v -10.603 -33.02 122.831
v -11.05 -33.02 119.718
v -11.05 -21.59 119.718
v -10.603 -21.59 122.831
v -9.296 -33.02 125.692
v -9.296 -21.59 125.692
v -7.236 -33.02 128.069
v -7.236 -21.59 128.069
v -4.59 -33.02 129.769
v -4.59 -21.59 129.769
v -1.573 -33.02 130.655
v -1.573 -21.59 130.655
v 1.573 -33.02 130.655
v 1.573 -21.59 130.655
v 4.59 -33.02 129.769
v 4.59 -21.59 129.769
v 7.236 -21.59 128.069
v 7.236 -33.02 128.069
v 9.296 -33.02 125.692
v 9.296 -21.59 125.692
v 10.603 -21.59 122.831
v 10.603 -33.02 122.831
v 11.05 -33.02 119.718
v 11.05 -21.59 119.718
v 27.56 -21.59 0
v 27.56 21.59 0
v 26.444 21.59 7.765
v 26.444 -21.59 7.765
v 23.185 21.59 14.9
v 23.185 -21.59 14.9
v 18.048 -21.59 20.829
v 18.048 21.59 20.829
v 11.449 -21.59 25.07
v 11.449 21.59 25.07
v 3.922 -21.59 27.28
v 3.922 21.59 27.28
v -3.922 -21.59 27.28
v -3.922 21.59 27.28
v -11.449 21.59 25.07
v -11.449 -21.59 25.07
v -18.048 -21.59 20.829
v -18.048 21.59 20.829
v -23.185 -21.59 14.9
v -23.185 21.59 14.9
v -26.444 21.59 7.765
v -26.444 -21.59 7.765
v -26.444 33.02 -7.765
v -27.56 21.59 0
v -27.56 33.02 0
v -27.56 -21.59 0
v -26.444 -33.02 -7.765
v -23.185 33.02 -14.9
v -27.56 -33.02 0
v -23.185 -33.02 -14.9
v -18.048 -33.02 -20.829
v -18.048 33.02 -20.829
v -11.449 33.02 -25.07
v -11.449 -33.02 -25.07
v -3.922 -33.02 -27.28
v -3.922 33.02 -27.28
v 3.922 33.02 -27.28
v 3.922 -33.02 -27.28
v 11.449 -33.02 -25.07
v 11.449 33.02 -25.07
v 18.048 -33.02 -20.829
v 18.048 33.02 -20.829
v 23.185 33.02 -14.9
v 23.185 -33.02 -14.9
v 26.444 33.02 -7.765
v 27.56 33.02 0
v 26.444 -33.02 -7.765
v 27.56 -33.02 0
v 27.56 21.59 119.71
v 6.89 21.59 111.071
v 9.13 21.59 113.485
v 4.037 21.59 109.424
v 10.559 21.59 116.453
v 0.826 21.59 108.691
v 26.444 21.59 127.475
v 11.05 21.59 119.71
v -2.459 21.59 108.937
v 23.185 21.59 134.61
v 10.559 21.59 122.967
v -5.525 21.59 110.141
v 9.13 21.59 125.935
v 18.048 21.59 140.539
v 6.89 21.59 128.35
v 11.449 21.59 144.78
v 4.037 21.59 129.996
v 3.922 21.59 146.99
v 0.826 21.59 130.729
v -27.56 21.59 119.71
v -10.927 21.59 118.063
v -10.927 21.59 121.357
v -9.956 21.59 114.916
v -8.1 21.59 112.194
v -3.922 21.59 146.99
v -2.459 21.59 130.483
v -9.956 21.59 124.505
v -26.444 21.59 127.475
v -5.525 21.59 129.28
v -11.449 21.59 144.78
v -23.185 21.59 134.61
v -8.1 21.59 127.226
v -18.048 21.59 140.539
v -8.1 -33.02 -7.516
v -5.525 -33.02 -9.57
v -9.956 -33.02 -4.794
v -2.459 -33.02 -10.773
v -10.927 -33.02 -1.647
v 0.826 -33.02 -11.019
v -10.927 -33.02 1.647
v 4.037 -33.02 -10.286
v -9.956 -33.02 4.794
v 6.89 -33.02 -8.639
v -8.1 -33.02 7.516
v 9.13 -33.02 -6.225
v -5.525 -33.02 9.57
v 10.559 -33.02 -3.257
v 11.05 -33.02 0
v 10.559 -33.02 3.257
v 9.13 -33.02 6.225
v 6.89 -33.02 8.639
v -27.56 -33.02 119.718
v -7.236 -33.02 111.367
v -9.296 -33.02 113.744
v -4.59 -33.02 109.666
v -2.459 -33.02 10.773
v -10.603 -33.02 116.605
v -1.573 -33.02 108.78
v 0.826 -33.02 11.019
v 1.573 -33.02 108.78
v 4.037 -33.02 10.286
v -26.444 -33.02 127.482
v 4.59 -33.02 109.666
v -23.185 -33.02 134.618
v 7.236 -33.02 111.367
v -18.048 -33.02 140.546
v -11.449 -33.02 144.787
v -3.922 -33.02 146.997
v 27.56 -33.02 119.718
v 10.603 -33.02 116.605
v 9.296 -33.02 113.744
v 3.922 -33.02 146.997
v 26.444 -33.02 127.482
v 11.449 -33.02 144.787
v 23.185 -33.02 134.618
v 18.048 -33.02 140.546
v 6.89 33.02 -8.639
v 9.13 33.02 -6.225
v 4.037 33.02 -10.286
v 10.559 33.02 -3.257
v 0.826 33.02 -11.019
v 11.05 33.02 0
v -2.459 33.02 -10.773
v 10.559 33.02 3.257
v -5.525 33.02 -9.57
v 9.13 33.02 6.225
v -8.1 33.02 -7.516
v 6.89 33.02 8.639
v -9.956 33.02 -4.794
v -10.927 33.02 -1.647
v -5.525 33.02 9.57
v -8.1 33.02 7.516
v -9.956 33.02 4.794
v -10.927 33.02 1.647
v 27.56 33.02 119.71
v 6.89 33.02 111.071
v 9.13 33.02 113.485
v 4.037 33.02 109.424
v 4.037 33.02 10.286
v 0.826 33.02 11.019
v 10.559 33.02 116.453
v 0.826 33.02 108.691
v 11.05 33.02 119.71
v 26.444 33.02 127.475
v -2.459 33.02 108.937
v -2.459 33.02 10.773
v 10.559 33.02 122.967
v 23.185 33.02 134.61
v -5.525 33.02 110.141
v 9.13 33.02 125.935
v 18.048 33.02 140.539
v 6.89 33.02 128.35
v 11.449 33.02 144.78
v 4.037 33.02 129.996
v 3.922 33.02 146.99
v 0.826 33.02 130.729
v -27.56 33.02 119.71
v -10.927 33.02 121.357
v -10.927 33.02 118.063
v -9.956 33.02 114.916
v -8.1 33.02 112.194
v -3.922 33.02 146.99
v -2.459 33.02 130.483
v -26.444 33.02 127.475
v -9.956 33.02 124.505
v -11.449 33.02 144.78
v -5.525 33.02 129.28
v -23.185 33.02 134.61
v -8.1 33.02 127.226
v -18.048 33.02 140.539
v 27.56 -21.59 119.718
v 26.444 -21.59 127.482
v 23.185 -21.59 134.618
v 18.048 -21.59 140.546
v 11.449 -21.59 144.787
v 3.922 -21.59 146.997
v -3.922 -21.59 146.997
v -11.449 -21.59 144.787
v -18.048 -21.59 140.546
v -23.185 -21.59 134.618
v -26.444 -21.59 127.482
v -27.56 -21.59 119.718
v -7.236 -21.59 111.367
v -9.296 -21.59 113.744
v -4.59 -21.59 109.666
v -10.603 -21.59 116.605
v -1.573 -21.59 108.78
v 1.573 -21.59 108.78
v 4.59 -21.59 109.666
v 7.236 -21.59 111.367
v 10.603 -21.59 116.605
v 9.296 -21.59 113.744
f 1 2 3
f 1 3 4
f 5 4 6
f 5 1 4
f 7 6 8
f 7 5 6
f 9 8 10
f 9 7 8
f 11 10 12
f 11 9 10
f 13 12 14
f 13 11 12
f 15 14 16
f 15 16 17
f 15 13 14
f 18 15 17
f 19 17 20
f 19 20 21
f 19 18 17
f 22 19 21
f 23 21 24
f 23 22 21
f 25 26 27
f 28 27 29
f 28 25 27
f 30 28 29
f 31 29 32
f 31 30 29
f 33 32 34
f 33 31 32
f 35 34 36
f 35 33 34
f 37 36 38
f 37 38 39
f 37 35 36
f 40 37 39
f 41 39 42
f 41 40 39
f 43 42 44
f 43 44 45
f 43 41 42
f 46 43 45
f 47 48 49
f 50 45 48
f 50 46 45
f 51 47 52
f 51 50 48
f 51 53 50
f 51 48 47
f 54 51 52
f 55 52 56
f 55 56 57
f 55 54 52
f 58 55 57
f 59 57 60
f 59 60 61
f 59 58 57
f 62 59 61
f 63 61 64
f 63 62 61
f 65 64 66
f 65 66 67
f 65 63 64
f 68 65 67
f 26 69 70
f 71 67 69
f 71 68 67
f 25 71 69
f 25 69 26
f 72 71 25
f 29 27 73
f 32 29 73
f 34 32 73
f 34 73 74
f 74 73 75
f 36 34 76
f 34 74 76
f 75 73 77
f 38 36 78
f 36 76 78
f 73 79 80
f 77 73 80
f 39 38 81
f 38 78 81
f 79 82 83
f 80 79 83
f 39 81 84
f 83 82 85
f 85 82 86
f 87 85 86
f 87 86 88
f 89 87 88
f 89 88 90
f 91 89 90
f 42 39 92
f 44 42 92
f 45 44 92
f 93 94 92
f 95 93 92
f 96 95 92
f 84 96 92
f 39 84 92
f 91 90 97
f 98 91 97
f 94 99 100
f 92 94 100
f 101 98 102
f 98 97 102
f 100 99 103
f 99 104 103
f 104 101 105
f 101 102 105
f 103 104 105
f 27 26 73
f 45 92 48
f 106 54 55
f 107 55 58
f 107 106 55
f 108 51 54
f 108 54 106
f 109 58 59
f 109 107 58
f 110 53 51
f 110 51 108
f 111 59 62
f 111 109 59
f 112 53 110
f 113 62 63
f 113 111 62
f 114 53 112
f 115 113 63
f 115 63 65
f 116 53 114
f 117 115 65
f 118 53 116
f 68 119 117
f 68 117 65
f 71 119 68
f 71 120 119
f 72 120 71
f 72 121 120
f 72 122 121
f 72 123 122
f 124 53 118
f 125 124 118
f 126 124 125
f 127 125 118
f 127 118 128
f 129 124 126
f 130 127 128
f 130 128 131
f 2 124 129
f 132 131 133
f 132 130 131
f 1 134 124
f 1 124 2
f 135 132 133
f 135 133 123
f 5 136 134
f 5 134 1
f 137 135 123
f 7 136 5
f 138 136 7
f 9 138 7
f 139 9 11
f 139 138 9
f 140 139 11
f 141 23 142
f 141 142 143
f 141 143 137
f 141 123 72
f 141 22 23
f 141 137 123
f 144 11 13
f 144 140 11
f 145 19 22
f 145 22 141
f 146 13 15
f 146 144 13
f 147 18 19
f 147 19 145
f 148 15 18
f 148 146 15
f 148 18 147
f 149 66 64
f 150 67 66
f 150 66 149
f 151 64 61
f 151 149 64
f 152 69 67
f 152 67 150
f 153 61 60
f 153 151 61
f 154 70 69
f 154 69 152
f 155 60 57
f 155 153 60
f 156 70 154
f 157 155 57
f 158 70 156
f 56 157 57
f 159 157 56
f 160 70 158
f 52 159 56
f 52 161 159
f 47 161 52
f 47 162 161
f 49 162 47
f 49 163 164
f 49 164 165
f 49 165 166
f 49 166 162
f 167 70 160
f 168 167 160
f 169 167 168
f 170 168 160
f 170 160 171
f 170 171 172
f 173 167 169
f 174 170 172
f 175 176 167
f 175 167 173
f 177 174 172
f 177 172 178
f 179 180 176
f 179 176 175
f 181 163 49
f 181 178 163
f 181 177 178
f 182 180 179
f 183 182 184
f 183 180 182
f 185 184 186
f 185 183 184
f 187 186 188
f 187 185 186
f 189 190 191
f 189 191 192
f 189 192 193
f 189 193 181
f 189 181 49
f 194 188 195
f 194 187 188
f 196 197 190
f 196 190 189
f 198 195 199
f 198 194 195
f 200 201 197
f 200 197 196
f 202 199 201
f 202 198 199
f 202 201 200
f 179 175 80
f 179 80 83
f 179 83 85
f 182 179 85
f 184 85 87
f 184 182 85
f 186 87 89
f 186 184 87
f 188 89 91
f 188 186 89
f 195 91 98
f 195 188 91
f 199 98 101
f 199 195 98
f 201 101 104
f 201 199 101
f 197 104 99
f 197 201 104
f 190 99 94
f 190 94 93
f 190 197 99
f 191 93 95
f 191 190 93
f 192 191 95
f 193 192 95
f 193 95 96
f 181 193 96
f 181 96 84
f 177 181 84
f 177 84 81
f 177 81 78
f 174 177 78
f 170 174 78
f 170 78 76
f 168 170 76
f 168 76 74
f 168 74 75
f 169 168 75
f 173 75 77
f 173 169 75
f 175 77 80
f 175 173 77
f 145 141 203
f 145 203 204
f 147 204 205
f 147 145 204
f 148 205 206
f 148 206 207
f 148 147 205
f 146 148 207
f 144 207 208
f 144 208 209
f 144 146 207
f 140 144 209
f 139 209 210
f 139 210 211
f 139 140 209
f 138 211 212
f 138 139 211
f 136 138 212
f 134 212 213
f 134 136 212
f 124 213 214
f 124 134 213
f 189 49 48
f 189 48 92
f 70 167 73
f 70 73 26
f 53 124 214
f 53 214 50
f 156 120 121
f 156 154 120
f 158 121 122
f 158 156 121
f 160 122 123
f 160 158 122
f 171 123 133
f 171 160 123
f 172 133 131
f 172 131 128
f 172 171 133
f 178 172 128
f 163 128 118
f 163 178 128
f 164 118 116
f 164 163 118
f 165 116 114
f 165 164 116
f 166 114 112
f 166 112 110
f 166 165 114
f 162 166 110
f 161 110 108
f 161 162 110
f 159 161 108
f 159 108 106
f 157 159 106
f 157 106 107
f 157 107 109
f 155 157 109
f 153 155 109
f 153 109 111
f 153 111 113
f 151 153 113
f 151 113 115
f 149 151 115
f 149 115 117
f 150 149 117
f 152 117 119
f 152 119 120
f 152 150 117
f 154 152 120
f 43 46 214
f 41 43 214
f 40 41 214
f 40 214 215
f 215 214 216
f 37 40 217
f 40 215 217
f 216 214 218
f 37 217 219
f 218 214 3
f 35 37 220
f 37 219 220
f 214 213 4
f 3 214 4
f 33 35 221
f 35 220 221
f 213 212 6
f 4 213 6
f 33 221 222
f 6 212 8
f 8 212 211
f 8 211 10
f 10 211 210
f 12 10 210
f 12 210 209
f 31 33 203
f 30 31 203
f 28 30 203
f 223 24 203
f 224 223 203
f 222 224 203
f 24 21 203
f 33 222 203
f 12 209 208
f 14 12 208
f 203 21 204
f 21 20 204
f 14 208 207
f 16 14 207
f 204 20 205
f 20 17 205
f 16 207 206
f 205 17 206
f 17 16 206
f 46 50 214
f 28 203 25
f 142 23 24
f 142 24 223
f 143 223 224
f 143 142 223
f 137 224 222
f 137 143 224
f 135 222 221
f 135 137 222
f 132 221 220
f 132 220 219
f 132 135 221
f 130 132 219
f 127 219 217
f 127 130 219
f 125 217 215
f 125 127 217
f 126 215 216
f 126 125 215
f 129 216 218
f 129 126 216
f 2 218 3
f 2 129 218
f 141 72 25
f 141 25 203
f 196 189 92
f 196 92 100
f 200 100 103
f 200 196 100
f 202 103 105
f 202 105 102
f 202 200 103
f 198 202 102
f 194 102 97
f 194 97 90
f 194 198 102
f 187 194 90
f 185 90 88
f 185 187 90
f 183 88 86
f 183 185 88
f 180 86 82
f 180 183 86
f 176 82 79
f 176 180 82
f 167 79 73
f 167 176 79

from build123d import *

# Parameters (mm, degrees)
F0_R     = 27.560129
F0_R_2   = 11.050129
F1_DEPTH = 33.02
F3_DEPTH = 11.43
F5_DEPTH = 11.43


with BuildPart() as f1:
    # F0 (on Front) → F1 (new body, symmetric)
    with BuildSketch(Plane.XZ):
        Circle(F0_R)
        Circle(F0_R_2, mode=Mode.SUBTRACT)
    extrude(amount=F1_DEPTH, both=True)

    # F2 (on face) → F3 (join)
    with BuildSketch(Plane.XZ.offset(33.02)):
        with BuildLine():
            Line((-27.560129, 119.717821), (-27.560129, 0))
            ThreePointArc((-27.560129, 0), (0, 27.560129), (27.560129, 0))
            Line((27.560129, 0), (27.560129, 119.717821))
            ThreePointArc((27.560129, 119.717821), (0, 92.157692), (-27.560129, 119.717821))
        make_face()
        with BuildLine():
            ThreePointArc((27.560129, 119.717821), (0, 147.277951), (-27.560129, 119.717821))
            Line((-27.560129, 119.717821), (-11.050129, 119.717821))
            ThreePointArc((-11.050129, 119.717821), (0, 130.767951), (11.050129, 119.717821))
            Line((11.050129, 119.717821), (27.560129, 119.717821))
        make_face()
        with BuildLine():
            Line((-11.050129, 119.717821), (-27.560129, 119.717821))
            ThreePointArc((-27.560129, 119.717821), (0, 92.157692), (27.560129, 119.717821))
            Line((27.560129, 119.717821), (11.050129, 119.717821))
            ThreePointArc((11.050129, 119.717821), (0, 108.667692), (-11.050129, 119.717821))
        make_face()
    extrude(amount=-F3_DEPTH)

    # F4 (on face) → F5 (join)
    with BuildSketch(Plane(origin=(0, 33.02, 0), x_dir=(-1, 0, 0), z_dir=(0, 1, 0))):
        with BuildLine():
            Line((-27.560129, 119.7102), (-27.560129, 0))
            ThreePointArc((-27.560129, 0), (0, 27.560129), (27.560129, 0))
            Line((27.560129, 0), (27.560129, 119.7102))
            ThreePointArc((27.560129, 119.7102), (0, 92.150071), (-27.560129, 119.7102))
        make_face()
        with BuildLine():
            Line((-11.050129, 119.7102), (-27.560129, 119.7102))
            ThreePointArc((-27.560129, 119.7102), (0, 92.150071), (27.560129, 119.7102))
            Line((27.560129, 119.7102), (11.050129, 119.7102))
            ThreePointArc((11.050129, 119.7102), (0, 108.660071), (-11.050129, 119.7102))
        make_face()
        with BuildLine():
            ThreePointArc((27.560129, 119.7102), (0, 147.270329), (-27.560129, 119.7102))
            Line((-27.560129, 119.7102), (-11.050129, 119.7102))
            ThreePointArc((-11.050129, 119.7102), (0, 130.760329), (11.050129, 119.7102))
            Line((11.050129, 119.7102), (27.560129, 119.7102))
        make_face()
    extrude(amount=-F5_DEPTH)


solid = f1.part
